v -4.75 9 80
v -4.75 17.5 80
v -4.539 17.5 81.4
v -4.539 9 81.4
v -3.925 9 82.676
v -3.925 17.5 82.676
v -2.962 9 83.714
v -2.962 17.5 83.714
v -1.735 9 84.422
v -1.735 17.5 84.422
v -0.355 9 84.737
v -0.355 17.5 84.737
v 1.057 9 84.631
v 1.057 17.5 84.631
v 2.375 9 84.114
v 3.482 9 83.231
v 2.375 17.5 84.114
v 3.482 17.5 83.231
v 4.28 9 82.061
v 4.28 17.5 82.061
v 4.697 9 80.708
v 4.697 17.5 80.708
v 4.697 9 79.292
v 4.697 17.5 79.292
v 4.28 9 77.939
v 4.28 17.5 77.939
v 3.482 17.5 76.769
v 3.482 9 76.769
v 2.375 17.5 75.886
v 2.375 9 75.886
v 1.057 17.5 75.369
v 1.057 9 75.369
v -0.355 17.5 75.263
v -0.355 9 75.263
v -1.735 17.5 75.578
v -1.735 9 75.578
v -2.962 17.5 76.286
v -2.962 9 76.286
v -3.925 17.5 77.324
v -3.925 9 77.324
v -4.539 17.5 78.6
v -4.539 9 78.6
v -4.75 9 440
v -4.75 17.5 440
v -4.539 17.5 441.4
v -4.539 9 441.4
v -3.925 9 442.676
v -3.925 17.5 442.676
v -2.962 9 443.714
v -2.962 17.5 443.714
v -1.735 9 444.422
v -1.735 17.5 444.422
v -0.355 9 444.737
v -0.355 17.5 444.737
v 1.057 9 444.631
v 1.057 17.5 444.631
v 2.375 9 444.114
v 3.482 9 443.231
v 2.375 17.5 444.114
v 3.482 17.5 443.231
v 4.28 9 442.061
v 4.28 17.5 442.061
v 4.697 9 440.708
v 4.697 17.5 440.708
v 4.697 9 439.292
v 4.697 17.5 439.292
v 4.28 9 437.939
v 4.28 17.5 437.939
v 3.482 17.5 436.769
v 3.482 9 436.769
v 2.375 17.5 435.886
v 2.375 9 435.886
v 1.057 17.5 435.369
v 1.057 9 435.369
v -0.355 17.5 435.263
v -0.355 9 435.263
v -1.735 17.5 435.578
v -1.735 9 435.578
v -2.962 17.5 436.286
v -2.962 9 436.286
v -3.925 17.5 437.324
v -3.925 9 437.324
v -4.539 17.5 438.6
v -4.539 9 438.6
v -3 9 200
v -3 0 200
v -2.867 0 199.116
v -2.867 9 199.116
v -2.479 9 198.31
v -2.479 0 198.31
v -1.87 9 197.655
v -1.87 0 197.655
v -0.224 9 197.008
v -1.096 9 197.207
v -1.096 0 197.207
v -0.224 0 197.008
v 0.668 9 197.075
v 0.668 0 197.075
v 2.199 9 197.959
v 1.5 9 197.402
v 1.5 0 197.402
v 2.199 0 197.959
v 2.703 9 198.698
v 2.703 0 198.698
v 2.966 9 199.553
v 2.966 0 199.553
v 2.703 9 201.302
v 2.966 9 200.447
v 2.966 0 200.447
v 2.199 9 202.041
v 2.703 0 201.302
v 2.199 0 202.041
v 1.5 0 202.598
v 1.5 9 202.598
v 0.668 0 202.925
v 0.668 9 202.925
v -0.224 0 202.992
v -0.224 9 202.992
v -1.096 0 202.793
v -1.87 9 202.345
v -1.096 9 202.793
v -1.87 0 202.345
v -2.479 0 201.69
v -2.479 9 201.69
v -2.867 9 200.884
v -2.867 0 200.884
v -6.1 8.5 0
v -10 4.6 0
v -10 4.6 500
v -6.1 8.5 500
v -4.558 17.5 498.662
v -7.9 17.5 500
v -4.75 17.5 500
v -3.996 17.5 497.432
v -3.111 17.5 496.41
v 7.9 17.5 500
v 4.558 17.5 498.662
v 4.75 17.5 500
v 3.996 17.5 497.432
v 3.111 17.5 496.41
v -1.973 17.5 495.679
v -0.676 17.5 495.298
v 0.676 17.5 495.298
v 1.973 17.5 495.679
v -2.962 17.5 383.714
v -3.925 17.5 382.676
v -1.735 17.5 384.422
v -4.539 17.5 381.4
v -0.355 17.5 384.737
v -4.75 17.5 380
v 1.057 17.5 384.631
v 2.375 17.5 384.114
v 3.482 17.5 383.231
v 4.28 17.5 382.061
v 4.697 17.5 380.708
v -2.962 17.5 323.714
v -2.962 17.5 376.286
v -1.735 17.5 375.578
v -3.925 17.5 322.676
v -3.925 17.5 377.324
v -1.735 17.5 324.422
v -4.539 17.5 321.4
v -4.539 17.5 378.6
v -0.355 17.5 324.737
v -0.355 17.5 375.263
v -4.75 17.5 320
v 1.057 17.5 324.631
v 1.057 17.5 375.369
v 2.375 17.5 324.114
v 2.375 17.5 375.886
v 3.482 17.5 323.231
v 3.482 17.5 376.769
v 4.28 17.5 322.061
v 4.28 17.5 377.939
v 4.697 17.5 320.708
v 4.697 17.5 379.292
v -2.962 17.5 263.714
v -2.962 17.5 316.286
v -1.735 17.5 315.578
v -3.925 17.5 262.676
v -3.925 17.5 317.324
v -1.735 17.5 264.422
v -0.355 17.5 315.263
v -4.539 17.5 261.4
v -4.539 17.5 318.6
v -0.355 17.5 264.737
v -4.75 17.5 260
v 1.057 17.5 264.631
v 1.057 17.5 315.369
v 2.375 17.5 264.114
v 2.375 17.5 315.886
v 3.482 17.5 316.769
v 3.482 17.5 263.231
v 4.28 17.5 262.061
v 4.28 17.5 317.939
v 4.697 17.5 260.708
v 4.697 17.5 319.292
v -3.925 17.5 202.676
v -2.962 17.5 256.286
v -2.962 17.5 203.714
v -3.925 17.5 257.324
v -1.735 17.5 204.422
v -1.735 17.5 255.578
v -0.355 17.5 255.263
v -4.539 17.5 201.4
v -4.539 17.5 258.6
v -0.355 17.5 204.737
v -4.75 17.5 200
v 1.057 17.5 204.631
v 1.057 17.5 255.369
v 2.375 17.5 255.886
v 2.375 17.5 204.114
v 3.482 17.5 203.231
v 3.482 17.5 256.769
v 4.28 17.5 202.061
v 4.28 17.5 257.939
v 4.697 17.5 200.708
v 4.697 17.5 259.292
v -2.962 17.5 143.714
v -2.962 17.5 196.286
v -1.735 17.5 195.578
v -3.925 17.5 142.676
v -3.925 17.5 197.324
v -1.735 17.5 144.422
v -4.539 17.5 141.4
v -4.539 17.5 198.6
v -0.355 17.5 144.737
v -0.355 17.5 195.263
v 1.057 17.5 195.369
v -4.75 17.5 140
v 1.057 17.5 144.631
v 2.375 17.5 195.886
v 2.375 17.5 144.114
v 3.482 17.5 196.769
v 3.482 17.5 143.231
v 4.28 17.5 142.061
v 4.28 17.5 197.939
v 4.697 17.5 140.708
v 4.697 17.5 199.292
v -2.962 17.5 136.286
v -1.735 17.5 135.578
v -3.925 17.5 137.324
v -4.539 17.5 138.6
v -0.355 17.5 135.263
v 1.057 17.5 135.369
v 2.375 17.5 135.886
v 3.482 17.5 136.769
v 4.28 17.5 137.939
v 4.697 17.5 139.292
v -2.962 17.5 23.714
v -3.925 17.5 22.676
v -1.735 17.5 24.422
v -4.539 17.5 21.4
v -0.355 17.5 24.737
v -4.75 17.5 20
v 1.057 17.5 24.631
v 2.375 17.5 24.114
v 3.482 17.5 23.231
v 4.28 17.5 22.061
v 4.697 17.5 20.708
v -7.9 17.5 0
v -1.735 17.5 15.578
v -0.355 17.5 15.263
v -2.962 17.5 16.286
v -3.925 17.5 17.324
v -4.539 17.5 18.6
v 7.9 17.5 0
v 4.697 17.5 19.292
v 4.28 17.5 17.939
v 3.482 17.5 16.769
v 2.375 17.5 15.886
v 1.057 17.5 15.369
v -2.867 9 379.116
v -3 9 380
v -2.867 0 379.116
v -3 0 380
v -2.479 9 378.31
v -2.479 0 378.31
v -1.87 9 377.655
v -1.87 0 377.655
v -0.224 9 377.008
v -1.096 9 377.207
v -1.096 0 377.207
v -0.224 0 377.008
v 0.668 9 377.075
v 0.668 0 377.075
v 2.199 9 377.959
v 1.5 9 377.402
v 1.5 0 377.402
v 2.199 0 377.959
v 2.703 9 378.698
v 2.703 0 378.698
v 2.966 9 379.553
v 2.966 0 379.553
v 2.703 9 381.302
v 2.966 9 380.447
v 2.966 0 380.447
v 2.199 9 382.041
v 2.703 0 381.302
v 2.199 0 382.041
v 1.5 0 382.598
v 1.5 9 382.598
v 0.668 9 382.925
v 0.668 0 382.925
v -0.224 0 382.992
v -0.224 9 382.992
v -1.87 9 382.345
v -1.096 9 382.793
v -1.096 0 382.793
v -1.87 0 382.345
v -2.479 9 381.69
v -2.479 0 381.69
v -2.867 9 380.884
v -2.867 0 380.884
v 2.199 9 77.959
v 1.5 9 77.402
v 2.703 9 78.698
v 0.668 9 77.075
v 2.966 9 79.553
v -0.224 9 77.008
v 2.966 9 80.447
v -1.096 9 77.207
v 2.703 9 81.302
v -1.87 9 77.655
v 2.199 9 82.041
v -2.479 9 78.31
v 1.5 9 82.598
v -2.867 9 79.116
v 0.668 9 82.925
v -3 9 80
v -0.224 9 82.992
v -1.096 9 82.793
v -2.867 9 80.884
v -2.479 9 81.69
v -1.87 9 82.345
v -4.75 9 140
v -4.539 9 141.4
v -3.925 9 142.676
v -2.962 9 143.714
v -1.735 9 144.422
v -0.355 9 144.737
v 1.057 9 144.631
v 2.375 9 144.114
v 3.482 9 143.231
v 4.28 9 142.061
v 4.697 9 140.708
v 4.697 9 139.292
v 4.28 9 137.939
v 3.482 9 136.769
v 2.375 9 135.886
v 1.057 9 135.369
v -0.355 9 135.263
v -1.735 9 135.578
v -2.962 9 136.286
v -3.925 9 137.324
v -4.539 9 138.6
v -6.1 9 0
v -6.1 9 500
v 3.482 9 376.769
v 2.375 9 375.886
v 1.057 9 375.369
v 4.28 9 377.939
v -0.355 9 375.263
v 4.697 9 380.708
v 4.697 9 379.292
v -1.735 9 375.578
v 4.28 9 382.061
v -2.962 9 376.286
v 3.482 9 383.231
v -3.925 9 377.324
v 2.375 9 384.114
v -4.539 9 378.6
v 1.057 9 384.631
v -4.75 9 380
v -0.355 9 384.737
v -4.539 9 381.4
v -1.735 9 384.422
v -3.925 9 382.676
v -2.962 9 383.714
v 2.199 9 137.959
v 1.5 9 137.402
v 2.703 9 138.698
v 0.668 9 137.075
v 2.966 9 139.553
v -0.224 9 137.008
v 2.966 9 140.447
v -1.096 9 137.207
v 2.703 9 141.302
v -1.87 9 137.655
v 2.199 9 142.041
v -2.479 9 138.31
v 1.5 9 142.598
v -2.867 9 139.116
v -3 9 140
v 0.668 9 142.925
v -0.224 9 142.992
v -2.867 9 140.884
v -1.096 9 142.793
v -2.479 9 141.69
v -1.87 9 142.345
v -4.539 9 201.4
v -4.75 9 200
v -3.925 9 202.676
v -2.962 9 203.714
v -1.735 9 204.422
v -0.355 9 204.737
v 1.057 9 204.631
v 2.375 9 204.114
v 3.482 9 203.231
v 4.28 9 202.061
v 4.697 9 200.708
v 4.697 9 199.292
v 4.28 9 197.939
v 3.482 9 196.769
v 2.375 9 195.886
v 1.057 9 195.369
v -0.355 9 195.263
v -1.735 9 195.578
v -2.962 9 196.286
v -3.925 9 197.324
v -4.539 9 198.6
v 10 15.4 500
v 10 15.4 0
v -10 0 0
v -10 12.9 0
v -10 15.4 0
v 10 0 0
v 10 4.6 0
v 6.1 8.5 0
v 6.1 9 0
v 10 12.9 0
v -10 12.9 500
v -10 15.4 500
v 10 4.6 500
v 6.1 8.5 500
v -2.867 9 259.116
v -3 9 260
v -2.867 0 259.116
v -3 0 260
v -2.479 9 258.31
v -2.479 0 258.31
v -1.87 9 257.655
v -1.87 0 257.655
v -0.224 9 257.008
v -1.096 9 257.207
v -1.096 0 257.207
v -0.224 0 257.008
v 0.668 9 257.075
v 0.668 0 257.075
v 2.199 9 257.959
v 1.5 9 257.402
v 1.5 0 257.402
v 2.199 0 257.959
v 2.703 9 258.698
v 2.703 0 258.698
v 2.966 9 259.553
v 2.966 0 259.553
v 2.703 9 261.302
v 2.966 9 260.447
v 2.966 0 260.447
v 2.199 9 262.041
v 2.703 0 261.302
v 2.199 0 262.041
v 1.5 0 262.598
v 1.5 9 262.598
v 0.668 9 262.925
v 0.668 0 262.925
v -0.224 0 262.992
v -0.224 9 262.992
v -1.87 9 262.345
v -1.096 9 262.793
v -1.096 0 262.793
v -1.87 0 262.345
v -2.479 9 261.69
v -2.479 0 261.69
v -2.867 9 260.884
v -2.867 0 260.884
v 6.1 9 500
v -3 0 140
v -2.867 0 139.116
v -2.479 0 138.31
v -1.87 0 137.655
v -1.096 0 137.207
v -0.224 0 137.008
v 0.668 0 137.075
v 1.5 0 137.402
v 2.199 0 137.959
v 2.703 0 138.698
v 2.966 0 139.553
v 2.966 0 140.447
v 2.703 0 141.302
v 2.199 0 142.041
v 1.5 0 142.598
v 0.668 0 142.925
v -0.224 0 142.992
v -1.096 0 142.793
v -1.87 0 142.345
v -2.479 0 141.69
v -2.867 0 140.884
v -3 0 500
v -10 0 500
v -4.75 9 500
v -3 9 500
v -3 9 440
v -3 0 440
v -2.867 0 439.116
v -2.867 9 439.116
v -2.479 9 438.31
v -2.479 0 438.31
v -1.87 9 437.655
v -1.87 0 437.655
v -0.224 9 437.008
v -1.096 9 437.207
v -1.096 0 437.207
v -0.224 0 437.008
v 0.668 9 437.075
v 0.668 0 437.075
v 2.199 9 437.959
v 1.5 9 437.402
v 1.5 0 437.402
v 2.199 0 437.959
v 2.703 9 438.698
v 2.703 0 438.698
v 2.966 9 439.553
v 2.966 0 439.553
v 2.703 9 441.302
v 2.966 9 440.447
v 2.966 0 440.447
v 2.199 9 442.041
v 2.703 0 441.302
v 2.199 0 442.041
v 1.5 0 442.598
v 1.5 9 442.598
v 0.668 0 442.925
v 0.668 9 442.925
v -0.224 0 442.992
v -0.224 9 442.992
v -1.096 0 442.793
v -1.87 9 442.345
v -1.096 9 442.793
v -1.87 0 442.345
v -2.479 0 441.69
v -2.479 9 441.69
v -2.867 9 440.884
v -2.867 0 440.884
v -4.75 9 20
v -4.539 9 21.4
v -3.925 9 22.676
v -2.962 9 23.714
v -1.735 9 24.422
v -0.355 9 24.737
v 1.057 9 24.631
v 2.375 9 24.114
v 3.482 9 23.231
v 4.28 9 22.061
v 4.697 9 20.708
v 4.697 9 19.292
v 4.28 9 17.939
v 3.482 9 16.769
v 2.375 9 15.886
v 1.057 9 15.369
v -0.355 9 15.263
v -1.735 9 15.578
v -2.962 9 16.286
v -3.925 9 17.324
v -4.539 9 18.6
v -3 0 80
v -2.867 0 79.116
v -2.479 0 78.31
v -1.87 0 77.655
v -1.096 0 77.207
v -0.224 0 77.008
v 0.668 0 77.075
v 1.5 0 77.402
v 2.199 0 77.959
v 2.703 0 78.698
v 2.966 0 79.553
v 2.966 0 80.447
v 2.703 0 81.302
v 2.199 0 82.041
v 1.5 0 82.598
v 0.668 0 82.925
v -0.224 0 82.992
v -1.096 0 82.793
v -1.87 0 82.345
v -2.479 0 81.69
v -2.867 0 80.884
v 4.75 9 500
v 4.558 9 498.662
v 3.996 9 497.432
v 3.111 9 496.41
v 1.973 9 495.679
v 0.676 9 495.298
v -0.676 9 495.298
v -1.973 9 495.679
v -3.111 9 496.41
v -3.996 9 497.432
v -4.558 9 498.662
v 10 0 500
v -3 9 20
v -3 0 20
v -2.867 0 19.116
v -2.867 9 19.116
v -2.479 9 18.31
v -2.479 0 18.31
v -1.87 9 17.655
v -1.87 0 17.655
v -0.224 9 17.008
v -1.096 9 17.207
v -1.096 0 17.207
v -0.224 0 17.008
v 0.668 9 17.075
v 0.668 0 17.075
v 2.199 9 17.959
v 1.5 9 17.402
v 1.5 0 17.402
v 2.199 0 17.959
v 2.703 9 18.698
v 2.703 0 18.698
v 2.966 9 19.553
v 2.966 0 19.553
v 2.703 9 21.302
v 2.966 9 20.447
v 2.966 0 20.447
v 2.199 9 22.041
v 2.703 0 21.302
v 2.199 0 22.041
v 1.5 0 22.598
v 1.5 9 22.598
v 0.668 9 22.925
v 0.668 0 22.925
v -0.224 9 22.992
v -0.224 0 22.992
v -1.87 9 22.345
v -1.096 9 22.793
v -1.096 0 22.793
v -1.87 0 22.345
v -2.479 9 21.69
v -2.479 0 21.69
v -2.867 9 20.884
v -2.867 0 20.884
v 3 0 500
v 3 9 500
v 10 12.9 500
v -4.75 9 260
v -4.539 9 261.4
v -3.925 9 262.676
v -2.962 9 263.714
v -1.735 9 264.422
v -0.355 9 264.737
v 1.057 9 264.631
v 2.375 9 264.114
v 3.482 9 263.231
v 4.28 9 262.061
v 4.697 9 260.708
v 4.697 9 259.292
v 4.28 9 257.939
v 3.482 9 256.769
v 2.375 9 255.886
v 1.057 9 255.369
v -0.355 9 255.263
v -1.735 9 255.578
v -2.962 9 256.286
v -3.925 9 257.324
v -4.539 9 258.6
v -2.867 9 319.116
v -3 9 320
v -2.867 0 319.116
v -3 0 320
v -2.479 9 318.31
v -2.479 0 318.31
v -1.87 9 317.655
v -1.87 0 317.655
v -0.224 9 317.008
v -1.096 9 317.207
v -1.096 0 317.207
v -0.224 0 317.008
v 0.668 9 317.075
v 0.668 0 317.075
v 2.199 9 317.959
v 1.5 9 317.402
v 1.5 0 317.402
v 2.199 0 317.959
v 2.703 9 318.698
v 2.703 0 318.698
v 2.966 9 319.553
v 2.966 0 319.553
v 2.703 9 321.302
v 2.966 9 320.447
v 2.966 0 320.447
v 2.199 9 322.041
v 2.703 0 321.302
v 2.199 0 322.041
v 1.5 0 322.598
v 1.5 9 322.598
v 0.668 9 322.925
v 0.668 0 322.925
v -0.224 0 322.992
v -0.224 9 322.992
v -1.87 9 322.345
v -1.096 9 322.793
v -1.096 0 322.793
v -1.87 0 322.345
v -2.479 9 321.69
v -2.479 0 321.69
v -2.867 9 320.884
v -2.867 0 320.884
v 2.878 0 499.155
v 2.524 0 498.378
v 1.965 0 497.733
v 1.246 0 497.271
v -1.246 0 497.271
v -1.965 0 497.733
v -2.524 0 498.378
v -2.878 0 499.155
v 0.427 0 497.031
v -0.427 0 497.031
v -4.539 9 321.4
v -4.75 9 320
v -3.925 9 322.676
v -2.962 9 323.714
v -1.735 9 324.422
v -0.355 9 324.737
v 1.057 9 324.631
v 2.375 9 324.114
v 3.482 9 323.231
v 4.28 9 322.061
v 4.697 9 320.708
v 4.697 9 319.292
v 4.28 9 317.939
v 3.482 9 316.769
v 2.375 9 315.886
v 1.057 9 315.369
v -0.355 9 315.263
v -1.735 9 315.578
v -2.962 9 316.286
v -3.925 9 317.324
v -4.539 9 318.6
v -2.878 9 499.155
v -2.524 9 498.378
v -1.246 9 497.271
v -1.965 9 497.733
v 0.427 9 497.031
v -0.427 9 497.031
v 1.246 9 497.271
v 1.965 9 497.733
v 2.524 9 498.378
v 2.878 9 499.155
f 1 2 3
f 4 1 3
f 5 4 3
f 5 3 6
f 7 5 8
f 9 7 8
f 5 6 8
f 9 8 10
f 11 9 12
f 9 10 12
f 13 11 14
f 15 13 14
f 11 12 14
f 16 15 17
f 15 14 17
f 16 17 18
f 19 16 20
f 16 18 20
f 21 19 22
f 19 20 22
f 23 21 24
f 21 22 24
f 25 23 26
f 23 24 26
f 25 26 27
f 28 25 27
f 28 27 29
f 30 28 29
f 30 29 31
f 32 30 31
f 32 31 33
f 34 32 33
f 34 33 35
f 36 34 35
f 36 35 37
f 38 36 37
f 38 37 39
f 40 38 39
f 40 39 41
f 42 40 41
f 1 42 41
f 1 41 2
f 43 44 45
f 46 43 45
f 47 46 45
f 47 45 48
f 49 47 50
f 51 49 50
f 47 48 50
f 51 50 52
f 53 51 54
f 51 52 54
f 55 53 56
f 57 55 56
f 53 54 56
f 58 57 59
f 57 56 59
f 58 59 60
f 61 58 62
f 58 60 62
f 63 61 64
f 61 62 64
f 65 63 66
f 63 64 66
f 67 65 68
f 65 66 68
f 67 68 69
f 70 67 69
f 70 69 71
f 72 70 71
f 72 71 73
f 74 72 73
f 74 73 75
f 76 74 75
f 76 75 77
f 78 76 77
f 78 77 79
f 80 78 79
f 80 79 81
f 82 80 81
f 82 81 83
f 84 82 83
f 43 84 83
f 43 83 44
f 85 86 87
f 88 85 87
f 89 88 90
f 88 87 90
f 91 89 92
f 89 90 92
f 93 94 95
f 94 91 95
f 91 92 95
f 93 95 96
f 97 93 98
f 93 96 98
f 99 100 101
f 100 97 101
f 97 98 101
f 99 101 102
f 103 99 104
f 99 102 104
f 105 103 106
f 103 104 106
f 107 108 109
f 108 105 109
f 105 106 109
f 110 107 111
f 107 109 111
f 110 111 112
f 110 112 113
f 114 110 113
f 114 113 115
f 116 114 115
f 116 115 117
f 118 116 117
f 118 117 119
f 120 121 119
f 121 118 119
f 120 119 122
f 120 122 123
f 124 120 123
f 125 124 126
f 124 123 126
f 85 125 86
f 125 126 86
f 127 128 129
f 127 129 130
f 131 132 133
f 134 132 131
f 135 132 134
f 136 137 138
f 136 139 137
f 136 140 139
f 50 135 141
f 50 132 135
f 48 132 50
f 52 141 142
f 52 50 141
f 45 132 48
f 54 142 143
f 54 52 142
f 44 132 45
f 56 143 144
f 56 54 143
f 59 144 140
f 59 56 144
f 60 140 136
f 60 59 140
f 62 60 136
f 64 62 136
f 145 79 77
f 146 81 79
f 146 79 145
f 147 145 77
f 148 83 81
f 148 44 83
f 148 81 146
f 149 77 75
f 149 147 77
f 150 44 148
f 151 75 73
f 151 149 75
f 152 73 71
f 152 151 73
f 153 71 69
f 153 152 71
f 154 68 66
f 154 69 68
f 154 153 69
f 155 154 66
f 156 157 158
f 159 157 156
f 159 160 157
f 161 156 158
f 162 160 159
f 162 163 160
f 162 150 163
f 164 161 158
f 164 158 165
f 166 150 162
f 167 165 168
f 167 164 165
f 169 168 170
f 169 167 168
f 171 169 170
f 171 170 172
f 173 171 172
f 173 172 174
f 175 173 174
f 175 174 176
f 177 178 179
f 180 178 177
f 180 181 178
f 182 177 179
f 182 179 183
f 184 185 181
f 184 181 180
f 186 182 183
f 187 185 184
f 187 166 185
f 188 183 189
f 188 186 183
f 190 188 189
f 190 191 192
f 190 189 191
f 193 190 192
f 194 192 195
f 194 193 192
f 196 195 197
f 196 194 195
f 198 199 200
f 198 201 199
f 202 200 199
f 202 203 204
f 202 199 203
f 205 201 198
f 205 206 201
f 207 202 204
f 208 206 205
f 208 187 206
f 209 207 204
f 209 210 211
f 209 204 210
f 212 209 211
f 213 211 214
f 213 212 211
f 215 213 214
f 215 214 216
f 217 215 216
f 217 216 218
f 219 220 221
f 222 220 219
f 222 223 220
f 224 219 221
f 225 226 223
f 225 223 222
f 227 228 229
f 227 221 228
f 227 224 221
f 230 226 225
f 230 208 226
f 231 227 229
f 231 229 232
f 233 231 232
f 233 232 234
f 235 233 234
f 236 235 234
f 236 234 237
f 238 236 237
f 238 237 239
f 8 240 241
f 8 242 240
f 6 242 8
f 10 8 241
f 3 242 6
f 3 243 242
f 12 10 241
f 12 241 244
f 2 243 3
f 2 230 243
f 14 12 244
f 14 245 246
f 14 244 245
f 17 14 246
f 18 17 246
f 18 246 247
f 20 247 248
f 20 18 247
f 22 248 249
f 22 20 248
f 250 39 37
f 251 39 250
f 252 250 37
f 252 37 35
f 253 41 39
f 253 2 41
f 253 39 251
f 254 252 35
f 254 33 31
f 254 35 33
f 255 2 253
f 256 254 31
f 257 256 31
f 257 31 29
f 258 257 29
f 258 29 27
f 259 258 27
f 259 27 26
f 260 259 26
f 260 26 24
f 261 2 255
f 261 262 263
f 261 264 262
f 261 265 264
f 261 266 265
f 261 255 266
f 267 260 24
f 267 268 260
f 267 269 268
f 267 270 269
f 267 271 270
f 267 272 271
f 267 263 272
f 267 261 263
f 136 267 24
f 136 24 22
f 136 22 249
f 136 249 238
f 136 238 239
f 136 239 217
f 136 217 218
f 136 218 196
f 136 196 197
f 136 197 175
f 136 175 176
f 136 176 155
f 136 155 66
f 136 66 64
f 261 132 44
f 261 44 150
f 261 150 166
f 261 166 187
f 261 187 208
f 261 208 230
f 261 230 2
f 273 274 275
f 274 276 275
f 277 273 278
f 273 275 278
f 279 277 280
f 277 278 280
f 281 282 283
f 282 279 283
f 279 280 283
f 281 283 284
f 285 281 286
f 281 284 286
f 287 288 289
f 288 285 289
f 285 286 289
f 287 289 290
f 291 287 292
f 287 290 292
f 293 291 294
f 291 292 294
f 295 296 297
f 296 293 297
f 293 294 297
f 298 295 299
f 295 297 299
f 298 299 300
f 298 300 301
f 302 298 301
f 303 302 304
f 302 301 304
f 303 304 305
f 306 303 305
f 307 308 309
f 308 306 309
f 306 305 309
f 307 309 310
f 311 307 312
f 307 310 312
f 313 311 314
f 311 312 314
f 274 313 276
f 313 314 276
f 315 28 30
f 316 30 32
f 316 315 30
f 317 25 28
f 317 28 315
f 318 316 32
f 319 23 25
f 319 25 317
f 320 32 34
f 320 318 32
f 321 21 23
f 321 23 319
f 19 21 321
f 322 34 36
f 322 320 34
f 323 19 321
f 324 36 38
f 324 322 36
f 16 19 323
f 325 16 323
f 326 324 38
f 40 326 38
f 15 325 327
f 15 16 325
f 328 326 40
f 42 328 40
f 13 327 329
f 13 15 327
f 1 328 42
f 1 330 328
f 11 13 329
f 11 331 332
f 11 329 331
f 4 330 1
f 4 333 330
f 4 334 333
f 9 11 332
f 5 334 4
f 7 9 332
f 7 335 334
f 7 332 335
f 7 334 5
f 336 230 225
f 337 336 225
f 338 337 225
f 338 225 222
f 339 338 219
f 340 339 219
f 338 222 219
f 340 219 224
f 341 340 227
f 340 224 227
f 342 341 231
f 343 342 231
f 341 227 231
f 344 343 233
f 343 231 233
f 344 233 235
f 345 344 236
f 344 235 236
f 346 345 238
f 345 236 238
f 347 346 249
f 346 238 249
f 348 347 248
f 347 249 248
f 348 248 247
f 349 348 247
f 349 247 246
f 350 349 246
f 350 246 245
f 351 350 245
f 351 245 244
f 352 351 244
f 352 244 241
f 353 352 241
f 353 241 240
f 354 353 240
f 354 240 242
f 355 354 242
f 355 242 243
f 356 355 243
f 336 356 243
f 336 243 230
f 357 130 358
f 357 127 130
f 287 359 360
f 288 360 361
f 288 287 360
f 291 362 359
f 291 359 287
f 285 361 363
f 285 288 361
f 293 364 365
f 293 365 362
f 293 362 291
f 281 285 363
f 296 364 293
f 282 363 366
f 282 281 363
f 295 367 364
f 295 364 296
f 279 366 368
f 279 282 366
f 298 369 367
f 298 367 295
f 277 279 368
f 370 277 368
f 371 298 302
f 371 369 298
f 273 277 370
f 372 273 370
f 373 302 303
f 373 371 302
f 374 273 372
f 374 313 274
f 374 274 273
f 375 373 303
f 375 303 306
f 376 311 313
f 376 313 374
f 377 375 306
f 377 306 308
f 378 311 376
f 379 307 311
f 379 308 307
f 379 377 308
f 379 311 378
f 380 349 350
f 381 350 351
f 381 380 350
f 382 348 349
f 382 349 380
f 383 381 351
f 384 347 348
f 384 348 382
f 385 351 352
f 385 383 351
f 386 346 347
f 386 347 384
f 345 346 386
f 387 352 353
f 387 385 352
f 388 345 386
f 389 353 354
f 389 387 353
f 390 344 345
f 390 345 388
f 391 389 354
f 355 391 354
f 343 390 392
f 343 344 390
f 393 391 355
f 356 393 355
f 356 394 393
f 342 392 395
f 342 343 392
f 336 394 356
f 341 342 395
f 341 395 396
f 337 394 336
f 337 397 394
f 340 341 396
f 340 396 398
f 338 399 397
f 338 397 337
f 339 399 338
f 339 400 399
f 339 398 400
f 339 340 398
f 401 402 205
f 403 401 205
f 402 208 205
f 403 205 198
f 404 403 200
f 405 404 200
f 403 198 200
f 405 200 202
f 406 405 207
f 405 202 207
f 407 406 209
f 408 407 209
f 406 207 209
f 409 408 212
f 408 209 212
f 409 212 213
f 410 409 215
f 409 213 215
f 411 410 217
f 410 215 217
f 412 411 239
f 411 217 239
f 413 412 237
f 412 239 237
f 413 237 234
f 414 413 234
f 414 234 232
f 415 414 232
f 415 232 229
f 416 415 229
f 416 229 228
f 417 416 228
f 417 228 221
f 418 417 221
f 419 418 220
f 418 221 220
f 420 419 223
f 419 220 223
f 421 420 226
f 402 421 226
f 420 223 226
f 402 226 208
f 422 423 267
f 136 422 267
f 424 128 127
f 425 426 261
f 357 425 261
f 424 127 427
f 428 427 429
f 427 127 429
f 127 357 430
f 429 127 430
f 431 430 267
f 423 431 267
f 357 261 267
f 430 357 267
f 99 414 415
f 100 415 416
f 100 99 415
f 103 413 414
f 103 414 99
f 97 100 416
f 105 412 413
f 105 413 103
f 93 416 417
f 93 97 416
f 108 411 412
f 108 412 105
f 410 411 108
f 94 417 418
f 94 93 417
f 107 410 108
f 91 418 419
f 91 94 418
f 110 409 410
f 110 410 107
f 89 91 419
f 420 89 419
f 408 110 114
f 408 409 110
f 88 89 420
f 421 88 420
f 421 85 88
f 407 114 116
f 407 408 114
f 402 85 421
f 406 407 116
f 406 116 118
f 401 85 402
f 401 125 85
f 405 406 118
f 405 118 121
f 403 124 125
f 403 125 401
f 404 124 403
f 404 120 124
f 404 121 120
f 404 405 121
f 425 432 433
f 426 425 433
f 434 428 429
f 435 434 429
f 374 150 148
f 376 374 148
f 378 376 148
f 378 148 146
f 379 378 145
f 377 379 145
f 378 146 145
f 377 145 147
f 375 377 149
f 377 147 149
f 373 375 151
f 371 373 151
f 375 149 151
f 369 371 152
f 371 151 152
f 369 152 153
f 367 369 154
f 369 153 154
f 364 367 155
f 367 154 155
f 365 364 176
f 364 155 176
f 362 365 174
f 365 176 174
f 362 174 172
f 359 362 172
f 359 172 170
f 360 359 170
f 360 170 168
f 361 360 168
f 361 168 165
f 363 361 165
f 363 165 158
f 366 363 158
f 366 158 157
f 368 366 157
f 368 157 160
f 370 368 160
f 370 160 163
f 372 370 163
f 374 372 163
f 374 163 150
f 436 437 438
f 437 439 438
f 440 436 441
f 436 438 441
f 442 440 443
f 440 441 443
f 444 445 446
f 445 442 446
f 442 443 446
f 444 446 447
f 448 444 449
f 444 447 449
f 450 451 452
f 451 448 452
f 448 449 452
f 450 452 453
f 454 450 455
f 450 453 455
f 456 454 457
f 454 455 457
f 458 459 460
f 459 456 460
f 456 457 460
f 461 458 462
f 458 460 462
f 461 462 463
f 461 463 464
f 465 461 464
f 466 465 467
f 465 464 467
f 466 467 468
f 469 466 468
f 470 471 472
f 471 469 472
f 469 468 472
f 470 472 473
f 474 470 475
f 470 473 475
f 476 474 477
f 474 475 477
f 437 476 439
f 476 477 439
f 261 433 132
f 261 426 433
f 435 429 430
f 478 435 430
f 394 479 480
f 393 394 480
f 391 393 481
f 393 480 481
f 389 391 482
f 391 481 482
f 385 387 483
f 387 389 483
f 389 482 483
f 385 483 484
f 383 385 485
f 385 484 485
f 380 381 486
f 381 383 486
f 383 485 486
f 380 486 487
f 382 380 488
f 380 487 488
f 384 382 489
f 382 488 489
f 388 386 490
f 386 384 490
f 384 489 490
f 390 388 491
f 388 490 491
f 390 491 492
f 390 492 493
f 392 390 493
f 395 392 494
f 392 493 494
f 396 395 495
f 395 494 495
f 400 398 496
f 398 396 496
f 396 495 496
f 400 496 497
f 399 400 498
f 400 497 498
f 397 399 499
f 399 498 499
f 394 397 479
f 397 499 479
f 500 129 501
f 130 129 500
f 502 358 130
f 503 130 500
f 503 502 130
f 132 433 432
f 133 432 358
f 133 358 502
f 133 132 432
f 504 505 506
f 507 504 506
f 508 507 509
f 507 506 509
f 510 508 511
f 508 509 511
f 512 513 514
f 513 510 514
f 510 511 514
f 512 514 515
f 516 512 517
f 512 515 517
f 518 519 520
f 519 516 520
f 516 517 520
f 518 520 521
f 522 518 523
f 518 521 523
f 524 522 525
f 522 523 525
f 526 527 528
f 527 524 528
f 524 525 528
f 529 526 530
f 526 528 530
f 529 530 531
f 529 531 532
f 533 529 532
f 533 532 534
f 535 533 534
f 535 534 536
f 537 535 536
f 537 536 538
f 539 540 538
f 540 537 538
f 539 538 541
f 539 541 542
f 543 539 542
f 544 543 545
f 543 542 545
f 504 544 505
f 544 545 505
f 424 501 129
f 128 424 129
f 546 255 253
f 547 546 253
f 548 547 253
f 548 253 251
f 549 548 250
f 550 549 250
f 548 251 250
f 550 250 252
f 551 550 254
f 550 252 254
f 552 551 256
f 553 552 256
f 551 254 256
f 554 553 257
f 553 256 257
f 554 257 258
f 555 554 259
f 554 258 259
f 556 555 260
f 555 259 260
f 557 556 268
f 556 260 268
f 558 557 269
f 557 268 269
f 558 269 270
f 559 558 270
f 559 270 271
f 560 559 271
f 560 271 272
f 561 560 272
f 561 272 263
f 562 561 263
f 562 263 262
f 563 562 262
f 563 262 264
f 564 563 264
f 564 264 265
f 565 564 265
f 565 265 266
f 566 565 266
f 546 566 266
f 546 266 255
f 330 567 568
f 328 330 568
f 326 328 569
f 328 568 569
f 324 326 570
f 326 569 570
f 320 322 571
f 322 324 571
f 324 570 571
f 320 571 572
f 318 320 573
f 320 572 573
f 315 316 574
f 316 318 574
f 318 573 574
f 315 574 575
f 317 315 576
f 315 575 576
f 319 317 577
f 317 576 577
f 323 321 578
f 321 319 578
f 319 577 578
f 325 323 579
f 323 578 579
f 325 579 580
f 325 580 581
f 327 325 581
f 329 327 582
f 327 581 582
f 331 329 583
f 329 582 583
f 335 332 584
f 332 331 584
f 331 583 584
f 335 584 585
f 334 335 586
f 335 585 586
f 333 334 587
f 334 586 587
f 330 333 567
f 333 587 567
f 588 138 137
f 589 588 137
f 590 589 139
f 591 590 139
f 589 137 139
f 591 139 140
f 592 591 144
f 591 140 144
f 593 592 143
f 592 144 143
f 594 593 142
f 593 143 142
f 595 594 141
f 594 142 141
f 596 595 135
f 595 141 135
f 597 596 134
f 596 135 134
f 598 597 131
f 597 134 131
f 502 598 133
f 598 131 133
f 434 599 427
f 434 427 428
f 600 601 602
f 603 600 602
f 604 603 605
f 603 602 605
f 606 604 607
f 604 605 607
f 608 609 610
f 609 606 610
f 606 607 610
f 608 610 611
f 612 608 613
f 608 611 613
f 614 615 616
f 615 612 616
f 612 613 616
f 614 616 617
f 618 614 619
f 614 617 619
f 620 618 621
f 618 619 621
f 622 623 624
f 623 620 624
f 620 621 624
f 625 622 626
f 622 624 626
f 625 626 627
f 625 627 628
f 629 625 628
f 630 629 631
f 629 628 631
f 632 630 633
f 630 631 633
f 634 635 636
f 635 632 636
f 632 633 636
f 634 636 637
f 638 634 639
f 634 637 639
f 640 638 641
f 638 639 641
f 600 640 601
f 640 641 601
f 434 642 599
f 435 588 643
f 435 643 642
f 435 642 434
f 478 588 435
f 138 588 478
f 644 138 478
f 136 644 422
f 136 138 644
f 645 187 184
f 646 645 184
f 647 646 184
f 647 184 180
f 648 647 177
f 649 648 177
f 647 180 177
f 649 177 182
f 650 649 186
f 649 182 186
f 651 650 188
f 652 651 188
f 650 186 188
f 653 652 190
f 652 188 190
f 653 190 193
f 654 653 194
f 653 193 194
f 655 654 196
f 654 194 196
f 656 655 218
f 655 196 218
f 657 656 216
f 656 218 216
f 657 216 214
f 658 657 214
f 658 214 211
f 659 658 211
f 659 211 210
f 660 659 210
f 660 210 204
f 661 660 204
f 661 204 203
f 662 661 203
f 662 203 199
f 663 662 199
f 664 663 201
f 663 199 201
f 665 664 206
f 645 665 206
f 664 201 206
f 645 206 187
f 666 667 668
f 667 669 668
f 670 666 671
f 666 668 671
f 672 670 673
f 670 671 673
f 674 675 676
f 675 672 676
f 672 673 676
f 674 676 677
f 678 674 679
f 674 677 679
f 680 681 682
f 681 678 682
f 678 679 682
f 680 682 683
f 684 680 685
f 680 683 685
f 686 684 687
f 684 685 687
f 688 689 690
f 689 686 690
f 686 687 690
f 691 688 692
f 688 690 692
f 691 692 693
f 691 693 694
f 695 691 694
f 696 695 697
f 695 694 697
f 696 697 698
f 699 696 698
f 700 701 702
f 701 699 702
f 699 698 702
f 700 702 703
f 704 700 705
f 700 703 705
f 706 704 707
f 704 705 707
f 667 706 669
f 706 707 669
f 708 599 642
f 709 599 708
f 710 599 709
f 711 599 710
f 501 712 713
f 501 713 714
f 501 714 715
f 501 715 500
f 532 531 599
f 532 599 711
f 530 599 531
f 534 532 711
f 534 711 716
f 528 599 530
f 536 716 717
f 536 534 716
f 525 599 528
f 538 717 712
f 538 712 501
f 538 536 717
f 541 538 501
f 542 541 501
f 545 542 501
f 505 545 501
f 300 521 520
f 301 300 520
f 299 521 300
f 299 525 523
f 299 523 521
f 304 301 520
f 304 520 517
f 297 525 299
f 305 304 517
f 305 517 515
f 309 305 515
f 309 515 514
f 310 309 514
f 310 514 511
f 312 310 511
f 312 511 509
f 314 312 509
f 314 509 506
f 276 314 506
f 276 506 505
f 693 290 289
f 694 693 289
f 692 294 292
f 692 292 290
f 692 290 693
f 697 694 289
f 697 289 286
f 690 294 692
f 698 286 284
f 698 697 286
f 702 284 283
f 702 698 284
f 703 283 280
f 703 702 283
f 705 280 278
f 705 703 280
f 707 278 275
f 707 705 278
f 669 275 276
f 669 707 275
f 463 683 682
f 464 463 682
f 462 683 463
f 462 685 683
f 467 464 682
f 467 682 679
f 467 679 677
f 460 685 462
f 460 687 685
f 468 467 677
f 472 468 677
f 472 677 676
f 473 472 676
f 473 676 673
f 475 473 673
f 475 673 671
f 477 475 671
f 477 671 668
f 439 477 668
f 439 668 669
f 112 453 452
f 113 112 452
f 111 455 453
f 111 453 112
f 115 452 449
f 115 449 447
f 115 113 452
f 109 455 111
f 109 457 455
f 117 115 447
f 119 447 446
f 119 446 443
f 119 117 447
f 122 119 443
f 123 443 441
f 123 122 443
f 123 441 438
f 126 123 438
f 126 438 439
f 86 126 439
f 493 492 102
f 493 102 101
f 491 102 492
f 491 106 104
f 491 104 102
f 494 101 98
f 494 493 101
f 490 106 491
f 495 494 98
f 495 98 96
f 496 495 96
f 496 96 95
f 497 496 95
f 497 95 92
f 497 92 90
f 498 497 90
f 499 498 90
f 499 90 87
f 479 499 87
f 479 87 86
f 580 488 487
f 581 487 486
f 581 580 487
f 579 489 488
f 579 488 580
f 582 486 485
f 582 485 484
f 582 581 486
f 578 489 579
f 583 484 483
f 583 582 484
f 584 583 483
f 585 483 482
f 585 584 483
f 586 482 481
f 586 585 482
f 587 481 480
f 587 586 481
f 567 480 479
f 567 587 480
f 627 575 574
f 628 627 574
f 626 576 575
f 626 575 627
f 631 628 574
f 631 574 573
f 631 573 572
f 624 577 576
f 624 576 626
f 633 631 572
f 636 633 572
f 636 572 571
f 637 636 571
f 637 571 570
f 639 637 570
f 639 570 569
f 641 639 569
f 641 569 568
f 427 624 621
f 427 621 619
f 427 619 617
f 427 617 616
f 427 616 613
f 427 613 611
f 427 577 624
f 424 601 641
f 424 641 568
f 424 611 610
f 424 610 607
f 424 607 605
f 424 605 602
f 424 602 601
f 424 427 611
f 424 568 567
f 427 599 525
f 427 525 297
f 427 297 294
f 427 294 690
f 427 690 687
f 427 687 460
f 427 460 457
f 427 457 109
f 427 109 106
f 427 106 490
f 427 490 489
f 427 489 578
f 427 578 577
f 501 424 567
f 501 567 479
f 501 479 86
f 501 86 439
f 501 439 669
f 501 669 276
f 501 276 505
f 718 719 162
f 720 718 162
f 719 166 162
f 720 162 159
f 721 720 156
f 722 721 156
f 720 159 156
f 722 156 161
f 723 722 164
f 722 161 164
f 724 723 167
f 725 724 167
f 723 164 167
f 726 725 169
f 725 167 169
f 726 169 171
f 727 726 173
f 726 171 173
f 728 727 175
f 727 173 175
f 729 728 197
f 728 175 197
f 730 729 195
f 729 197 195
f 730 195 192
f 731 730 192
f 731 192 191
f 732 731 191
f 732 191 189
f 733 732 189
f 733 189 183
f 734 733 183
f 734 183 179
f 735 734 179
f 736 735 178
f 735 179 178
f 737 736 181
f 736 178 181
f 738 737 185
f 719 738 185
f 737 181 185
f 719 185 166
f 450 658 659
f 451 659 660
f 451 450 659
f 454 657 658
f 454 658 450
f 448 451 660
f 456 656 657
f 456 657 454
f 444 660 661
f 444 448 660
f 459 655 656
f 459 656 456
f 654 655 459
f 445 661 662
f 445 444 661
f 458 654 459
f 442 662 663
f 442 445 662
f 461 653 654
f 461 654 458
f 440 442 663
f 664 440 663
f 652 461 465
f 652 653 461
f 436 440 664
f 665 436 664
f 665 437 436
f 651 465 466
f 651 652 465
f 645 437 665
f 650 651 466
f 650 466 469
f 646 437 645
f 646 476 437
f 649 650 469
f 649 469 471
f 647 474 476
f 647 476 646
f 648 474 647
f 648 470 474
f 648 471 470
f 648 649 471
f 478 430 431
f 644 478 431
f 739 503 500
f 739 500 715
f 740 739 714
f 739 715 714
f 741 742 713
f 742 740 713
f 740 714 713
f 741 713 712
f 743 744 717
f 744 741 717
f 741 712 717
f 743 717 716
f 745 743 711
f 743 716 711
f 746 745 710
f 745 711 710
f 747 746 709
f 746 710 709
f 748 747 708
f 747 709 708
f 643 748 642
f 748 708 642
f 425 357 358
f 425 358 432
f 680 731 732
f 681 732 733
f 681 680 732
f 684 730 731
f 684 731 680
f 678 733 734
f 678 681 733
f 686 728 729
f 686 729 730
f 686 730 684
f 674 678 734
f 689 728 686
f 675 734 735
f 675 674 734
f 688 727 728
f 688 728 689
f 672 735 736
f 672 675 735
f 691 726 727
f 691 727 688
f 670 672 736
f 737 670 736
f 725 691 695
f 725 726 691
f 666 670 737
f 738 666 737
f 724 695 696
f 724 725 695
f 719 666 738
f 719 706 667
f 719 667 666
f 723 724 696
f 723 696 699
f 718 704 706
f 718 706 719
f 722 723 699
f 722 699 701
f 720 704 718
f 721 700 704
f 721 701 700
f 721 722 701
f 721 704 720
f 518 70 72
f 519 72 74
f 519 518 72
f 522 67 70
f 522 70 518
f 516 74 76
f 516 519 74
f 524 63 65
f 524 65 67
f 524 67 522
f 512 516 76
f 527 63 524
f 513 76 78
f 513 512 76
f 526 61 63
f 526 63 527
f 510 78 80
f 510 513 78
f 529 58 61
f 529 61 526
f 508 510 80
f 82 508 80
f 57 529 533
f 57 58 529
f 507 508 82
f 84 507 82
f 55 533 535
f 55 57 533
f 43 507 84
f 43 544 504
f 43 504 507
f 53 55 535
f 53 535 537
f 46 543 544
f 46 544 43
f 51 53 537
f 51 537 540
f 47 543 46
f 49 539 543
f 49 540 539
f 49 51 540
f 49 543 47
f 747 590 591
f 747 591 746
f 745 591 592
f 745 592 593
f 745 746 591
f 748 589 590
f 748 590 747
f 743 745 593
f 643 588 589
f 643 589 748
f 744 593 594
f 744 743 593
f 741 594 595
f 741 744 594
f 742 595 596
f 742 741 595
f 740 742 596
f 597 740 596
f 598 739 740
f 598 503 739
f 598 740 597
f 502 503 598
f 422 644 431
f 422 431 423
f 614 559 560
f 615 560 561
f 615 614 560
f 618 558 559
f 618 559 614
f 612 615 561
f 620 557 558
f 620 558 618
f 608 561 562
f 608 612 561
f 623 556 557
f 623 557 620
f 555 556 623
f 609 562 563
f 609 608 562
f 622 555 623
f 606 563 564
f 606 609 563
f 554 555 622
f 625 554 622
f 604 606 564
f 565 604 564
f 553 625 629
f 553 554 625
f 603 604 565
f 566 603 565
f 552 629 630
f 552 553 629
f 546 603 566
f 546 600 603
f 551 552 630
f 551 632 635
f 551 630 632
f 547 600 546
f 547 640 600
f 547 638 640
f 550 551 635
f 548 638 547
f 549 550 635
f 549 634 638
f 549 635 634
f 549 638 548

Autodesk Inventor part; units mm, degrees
ref_plane "YZ Plane" through (0, 0, 0) normal (1, 0, 0) x (0, 1, 0)
ref_plane "XZ Plane" through (0, 0, 0) normal (0, 1, 0) x (-1, 0, 0)
ref_plane "XY Plane" through (0, 0, 0) normal (0, 0, 1) x (1, 0, 0)
sketch "Sketch1" plane through (0, 0, 0) normal (0, 0, 1) x (1, 0, 0)
  line L0 (0, 0) -> (0, 17.5) construction
  line L1 (0, 0) -> (-10, 0)
  line L2 (0, 0) -> (10, 0)
  line L3 (-10, 0) -> (-10, 4.6)
  line L4 (-10, 4.6) -> (-6.1, 8.5)
  line L5 (-6.1, 8.5) -> (-6.1, 9)
  line L6 (-6.1, 9) -> (-10, 12.9)
  line L7 (-10, 12.9) -> (-10, 15.4)
  line L8 (-10, 15.4) -> (-7.9, 17.5)
  line L9 (-7.9, 17.5) -> (0, 17.5)
  line L10 (10, 0) -> (10, 4.6)
  line L11 (10, 4.6) -> (6.1, 8.5)
  line L12 (6.1, 8.5) -> (6.1, 9)
  line L13 (6.1, 9) -> (10, 12.9)
  line L14 (10, 12.9) -> (10, 15.4)
  line L15 (10, 15.4) -> (7.9, 17.5)
  line L16 (7.9, 17.5) -> (0, 17.5)
  dimension "d0" = 17.5
  dimension "d1" = 20
  dimension "d2" = 4.6
  dimension "d3" = 8.5
  dimension "d8" = 135
  dimension "d9" = 0.5
  dimension "d10" = 135
  dimension "d11" = 2.5
extrude "Extrusion1" add sketch "Sketch1" along normal blind 500
sketch "Sketch2" plane through (0, 0, 0) normal (0, 1, 0) x (-1, 0, 0)
  line L0 (0, 0) -> (0, 20) construction
  line L1 (0, 20) -> (0, 80) construction
  circle A0 centre (0, 20) radius 4.75
  circle A1 centre (0, 20) radius 3
  dimension "d14" = 20
  dimension "d15" = 60
  dimension "d16" = 9.5
  dimension "d17" = 6
extrude "Extrusion2" cut sketch "Sketch2" along normal through all contours A1
extrude "Extrusion3" cut sketch "Sketch2" against normal blind 8.5 from surface at 17.5
pattern_linear "Rectangular Pattern1" count 9 spacing 60 along (0, 0, 1) of "Extrusion2", "Extrusion3"
properties part number "HGR20 500mm"
